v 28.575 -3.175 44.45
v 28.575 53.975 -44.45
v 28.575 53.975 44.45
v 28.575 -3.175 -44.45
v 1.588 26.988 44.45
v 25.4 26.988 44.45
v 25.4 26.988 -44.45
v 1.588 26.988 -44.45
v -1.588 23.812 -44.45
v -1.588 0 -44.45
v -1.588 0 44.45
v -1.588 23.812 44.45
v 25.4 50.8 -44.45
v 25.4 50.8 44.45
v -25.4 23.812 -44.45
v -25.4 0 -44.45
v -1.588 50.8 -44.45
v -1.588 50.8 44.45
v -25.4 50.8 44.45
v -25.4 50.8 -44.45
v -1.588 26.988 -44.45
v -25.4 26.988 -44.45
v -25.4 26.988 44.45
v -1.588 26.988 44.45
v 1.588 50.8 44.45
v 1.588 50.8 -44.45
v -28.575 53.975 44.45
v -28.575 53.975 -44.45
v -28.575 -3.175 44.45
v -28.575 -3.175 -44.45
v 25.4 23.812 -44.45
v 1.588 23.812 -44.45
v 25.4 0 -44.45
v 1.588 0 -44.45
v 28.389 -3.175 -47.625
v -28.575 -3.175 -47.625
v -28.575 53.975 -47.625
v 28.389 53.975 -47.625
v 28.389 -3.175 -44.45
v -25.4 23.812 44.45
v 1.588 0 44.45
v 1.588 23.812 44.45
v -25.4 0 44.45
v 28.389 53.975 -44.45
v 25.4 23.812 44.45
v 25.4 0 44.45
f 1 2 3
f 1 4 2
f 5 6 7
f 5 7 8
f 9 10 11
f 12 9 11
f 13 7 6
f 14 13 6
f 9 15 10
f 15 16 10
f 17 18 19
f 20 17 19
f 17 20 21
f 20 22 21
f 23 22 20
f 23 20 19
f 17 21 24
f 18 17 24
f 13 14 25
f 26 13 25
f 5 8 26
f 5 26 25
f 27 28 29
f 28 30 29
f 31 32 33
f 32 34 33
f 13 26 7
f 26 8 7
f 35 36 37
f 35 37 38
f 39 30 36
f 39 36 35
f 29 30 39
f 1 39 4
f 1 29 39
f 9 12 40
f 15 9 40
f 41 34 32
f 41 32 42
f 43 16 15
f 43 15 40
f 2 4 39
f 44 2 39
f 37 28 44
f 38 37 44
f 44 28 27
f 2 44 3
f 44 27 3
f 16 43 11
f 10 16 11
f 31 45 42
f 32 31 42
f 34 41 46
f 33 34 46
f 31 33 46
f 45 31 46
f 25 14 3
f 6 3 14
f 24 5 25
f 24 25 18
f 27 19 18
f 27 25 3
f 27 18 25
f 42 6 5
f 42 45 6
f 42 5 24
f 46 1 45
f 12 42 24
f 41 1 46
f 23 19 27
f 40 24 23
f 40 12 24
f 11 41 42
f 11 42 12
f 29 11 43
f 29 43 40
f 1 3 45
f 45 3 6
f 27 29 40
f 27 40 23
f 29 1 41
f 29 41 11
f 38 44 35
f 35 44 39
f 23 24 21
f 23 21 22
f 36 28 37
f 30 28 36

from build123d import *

# Parameters (mm, degrees)
F0_W      = 57.15
F0_H      = 88.9
F1_DEPTH  = 3.175
F2_W      = 3.175
F2_H      = 88.9
F3_DEPTH  = 50.8
F4_W      = 3.175
F4_H      = 88.9
F5_DEPTH  = 50.8
F6_W      = 3.175
F6_H      = 88.9
F7_DEPTH  = 50.8
F7_FACE_W = 3.175
F7_FACE_H = 88.9
F8_DEPTH  = 50.8
F9_W      = 3.175
F9_H      = 88.9
F10_DEPTH = 23.8125
F11_W     = 50.8
F11_H     = 88.9
F12_DEPTH = 3.175
F13_W     = 3.175
F13_H     = 88.9
F14_DEPTH = 23.8125
F15_W     = 57.15
F15_H     = 88.9
F16_DEPTH = 3.175
F17_W     = 56.964433
F17_H     = 57.15
F18_DEPTH = 3.175


with BuildPart() as f1:
    # F0 (on Front) → F1 (new body)
    with BuildSketch(Plane.XZ):
        Rectangle(F0_W, F0_H)
    extrude(amount=F1_DEPTH)

    # F2 (on face) → F3 (join)
    with BuildSketch(Plane(origin=(0, 0, 0), x_dir=(-1, 0, 0), z_dir=(0, 1, 0))):
        with Locations((-26.9875, 0)):
            Rectangle(F2_W, F2_H)
    extrude(amount=F3_DEPTH)

    # F4 (on face) → F5 (join)
    with BuildSketch(Plane(origin=(0, 0, 0), x_dir=(-1, 0, 0), z_dir=(0, 1, 0))):
        with Locations((26.9875, 0)):
            Rectangle(F4_W, F4_H)
    extrude(amount=F5_DEPTH)

    # F6 (on face) → F7 (join)
    with BuildSketch(Plane(origin=(0, 0, 0), x_dir=(-1, 0, 0), z_dir=(0, 1, 0))):
        Rectangle(F6_W, F6_H)
    extrude(amount=F7_DEPTH)

    # F7_face (on face) → F8 (cut)
    with BuildSketch(Plane(origin=(0, 50.8, 0), x_dir=(-1, 0, 0), z_dir=(0, 1, 0))):
        Rectangle(F7_FACE_W, F7_FACE_H)
    extrude(amount=-F8_DEPTH, mode=Mode.SUBTRACT)



with BuildPart() as f10:
    # F9 (on face) → F10 (new body)
    with BuildSketch(Plane(origin=(0, 26.9875, 0), x_dir=(-1, 0, 0), z_dir=(0, 1, 0))):
        Rectangle(F9_W, F9_H)
    extrude(amount=F10_DEPTH)


with BuildPart() as f1_1:
    add(f1.part)

    add(f10.part)  # F12 merges F10
    # F11 (on face) → F12 (join)
    with BuildSketch(Plane(origin=(0, 23.8125, 0), x_dir=(-1, 0, 0), z_dir=(0, 1, 0))):
        Rectangle(F11_W, F11_H)
    extrude(amount=F12_DEPTH)

    # F13 (on face) → F14 (join)
    with BuildSketch(Plane(origin=(0, 0, 0), x_dir=(-1, 0, 0), z_dir=(0, 1, 0))):
        Rectangle(F13_W, F13_H)
    extrude(amount=F14_DEPTH)

    # F15 (on face) → F16 (join)
    with BuildSketch(Plane(origin=(0, 50.8, 0), x_dir=(-1, 0, 0), z_dir=(0, 1, 0))):
        Rectangle(F15_W, F15_H)
    extrude(amount=F16_DEPTH)

    # F17 (on face) → F18 (join)
    with BuildSketch(Plane(origin=(0, 0, -44.45), x_dir=(1, 0, 0), z_dir=(0, 0, -1))):
        with Locations((-0.092783, -25.4)):
            Rectangle(F17_W, F17_H)
    extrude(amount=F18_DEPTH)


solid = f1_1.part
